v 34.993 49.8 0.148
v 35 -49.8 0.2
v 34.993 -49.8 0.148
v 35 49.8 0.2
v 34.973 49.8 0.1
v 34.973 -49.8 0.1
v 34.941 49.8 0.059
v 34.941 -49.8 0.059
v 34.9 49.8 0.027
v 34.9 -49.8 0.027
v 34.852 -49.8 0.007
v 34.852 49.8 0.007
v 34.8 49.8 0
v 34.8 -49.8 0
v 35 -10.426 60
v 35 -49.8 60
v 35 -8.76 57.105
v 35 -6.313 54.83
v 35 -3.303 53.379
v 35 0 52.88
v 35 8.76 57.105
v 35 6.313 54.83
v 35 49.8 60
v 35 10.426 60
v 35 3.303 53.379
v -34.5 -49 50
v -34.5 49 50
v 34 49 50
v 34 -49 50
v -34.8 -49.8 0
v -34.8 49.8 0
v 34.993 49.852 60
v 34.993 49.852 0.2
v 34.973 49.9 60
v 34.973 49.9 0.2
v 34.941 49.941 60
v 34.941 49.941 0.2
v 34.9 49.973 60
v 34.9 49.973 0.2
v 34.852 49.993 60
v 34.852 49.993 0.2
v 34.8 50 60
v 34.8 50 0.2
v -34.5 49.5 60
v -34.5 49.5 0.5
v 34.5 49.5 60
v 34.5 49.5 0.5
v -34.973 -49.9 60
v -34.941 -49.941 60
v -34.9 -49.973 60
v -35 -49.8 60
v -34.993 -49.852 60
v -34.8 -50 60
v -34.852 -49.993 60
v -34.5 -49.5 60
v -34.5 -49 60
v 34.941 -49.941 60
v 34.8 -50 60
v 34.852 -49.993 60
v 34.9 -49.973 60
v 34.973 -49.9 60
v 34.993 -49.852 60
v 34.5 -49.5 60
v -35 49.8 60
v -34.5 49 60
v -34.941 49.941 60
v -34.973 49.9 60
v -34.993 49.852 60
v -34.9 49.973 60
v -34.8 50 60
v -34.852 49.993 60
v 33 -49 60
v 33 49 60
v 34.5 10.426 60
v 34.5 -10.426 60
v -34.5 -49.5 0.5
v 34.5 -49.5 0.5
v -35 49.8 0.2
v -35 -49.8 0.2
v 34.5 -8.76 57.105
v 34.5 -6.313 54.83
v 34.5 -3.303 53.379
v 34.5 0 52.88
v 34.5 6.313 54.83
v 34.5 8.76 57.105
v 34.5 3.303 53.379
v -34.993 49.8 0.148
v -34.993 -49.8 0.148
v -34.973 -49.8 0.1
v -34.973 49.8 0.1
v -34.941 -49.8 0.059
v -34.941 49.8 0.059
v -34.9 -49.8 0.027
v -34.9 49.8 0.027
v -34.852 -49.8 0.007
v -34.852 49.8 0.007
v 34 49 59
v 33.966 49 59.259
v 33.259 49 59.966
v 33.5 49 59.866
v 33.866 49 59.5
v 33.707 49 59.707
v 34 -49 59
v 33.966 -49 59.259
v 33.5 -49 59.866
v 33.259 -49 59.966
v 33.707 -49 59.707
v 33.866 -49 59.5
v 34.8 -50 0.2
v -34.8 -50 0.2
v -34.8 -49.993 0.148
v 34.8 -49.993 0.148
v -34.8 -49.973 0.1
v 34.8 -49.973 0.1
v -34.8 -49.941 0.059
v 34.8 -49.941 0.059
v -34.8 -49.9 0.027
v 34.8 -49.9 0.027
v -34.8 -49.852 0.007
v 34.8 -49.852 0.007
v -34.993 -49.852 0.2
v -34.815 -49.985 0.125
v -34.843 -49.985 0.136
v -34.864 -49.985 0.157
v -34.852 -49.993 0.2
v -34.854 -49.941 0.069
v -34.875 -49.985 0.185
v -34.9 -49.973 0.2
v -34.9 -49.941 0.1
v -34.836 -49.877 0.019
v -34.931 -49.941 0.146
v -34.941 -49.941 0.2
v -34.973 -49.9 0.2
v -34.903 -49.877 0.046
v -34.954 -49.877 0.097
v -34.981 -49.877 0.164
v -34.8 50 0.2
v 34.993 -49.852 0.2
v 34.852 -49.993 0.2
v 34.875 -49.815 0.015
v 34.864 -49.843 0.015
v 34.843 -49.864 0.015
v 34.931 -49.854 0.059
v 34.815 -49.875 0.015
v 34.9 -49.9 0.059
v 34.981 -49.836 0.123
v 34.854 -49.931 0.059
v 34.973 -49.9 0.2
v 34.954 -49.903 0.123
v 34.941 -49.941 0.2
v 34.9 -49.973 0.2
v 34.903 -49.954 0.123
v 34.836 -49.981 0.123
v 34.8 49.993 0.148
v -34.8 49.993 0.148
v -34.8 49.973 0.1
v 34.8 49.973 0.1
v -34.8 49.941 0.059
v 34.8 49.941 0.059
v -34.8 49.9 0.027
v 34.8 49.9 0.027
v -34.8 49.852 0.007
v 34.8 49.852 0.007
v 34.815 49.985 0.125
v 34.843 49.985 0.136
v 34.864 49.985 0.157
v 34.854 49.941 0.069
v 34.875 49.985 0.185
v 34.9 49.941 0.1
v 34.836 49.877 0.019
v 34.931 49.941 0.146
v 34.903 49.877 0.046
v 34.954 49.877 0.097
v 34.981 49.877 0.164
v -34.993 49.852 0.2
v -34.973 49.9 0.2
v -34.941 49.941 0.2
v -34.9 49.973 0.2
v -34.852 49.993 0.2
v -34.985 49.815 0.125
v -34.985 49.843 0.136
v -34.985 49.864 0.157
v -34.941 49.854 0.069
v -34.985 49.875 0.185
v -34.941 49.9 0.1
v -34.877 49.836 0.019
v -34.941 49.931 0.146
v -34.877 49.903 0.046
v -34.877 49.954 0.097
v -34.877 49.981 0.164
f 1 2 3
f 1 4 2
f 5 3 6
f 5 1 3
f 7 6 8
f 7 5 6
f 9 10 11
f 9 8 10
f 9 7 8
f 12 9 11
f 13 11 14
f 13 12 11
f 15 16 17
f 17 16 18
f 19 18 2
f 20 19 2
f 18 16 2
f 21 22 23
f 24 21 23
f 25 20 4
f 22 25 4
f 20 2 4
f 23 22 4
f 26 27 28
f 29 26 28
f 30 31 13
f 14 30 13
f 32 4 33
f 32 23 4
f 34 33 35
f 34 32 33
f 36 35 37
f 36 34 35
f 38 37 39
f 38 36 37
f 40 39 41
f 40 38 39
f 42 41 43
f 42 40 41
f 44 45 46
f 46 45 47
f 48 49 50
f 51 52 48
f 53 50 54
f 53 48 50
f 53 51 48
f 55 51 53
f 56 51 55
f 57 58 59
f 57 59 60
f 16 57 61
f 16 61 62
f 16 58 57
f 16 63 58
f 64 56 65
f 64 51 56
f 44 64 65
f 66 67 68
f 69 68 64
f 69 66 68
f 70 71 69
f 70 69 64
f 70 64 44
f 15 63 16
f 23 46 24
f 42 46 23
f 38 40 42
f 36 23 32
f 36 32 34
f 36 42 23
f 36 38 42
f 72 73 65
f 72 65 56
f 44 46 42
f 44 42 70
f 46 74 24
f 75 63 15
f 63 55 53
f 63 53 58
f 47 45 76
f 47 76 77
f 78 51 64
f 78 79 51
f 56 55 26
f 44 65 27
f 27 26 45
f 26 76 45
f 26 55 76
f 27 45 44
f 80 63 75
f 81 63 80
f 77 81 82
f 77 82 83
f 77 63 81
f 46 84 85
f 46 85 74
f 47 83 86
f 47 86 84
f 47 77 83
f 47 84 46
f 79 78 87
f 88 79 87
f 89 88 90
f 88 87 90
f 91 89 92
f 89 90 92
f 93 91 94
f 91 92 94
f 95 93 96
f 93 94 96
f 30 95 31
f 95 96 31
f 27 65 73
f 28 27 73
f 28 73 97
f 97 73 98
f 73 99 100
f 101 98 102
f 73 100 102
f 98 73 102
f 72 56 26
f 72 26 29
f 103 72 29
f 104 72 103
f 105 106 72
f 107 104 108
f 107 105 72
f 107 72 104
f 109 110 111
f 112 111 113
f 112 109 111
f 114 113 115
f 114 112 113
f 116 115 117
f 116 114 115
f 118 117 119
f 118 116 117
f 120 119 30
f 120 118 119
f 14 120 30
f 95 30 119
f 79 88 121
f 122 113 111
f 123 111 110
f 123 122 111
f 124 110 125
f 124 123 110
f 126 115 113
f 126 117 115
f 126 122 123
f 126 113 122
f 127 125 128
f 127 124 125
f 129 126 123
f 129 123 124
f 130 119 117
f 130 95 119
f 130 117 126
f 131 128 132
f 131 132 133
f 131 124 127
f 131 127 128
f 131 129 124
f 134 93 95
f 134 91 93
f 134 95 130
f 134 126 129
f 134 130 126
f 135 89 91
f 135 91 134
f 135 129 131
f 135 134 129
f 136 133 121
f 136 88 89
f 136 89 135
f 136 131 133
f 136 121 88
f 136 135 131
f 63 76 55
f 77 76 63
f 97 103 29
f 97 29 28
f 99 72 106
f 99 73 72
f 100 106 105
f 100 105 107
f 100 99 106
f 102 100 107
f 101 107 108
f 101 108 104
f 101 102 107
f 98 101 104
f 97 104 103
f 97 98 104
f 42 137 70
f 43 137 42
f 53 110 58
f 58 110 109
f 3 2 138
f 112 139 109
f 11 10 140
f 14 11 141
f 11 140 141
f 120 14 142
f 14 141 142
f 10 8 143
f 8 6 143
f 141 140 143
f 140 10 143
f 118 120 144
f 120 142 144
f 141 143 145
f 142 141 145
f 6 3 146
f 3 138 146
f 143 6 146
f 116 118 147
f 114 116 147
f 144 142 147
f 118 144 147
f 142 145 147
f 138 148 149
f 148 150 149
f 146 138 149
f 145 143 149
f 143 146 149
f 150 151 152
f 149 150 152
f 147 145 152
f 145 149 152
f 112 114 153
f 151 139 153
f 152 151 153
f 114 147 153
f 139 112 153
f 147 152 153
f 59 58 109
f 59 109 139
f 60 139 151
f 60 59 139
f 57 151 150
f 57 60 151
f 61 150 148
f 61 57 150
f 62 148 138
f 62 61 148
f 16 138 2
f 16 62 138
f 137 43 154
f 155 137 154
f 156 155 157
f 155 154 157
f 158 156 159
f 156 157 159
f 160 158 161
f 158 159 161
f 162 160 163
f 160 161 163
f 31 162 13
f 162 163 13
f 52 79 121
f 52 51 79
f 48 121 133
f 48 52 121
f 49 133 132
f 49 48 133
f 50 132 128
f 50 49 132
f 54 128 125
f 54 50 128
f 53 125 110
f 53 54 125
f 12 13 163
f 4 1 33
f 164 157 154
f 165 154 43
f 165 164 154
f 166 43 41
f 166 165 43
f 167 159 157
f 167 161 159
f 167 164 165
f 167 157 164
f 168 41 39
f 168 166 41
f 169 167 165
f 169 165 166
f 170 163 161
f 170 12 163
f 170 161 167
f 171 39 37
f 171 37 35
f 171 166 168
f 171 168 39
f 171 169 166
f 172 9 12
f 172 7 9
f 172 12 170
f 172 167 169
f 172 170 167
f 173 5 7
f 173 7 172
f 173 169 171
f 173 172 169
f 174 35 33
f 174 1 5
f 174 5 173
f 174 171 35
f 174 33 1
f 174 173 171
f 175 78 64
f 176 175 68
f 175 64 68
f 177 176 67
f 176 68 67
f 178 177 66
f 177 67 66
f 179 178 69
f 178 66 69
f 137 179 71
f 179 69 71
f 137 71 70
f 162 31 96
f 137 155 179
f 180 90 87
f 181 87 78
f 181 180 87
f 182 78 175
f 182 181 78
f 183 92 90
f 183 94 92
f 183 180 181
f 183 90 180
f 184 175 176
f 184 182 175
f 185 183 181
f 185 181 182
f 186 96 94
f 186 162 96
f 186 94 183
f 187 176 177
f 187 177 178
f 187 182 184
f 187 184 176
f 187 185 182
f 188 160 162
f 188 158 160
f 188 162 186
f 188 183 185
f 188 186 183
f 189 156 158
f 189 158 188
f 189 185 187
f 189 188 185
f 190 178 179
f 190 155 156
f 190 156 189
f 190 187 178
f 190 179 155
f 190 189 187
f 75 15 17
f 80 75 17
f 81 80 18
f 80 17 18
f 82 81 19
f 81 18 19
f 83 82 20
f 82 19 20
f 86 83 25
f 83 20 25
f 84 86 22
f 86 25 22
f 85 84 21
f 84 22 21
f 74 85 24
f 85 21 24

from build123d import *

# Parameters (mm, degrees)
F0_W     = 70
F0_H     = 100
F1_DEPTH = 60
F2_R     = 0.2
F3_T     = -0.5
F4_W     = 68.5
F4_H     = 98
F5_DEPTH = 0.5
F6_DEPTH = 10
F7_R     = 1
F9_DEPTH = 0.5


with BuildPart() as f1:
    # F0 (on Top) → F1 (new body)
    with BuildSketch(Plane.XY):
        Rectangle(F0_W, F0_H)
    extrude(amount=F1_DEPTH)

    # F2
    f2_edges = [f1.edges().sort_by_distance(p)[0] for p in [
        (35, -50, 30),
        (35, 0, 0),
        (0, 50, 0),
        (-35, 0, 0),
        (0, -50, 0),
        (35, 50, 30),
        (-35, 50, 30),
        (-35, -50, 30),
    ]]
    fillet(f2_edges, radius=F2_R)

    # F3
    f3_openings = [f1.faces().sort_by_distance(p)[0] for p in [
        (0, 0, 60),
    ]]
    offset(amount=F3_T, openings=f3_openings)

    # F4 (on face) → F5 (join)
    with BuildSketch(Plane.XY.offset(60)):
        with Locations((-0.25, 0)):
            Rectangle(F4_W, F4_H)
    extrude(amount=-F5_DEPTH)

    # F4 (on face) → F6 (join)
    with BuildSketch(Plane.XY.offset(60)):
        with Locations((-0.25, 0)):
            Rectangle(F4_W, F4_H)
    extrude(amount=-F6_DEPTH)

    # F7
    f7_edges = [f1.edges().sort_by_distance(p)[0] for p in [
        (34, 0, 60),
    ]]
    fillet(f7_edges, radius=F7_R)

    # F8 (on face) → F9 (cut)
    with BuildSketch(Plane.YZ.offset(35)):
        with BuildLine():
            Line((10.426263, 60), (-10.426263, 60))
            ThreePointArc((-10.426263, 60), (0, 52.880268), (10.426263, 60))
        make_face()
    extrude(amount=-F9_DEPTH, mode=Mode.SUBTRACT)


solid = f1.part
